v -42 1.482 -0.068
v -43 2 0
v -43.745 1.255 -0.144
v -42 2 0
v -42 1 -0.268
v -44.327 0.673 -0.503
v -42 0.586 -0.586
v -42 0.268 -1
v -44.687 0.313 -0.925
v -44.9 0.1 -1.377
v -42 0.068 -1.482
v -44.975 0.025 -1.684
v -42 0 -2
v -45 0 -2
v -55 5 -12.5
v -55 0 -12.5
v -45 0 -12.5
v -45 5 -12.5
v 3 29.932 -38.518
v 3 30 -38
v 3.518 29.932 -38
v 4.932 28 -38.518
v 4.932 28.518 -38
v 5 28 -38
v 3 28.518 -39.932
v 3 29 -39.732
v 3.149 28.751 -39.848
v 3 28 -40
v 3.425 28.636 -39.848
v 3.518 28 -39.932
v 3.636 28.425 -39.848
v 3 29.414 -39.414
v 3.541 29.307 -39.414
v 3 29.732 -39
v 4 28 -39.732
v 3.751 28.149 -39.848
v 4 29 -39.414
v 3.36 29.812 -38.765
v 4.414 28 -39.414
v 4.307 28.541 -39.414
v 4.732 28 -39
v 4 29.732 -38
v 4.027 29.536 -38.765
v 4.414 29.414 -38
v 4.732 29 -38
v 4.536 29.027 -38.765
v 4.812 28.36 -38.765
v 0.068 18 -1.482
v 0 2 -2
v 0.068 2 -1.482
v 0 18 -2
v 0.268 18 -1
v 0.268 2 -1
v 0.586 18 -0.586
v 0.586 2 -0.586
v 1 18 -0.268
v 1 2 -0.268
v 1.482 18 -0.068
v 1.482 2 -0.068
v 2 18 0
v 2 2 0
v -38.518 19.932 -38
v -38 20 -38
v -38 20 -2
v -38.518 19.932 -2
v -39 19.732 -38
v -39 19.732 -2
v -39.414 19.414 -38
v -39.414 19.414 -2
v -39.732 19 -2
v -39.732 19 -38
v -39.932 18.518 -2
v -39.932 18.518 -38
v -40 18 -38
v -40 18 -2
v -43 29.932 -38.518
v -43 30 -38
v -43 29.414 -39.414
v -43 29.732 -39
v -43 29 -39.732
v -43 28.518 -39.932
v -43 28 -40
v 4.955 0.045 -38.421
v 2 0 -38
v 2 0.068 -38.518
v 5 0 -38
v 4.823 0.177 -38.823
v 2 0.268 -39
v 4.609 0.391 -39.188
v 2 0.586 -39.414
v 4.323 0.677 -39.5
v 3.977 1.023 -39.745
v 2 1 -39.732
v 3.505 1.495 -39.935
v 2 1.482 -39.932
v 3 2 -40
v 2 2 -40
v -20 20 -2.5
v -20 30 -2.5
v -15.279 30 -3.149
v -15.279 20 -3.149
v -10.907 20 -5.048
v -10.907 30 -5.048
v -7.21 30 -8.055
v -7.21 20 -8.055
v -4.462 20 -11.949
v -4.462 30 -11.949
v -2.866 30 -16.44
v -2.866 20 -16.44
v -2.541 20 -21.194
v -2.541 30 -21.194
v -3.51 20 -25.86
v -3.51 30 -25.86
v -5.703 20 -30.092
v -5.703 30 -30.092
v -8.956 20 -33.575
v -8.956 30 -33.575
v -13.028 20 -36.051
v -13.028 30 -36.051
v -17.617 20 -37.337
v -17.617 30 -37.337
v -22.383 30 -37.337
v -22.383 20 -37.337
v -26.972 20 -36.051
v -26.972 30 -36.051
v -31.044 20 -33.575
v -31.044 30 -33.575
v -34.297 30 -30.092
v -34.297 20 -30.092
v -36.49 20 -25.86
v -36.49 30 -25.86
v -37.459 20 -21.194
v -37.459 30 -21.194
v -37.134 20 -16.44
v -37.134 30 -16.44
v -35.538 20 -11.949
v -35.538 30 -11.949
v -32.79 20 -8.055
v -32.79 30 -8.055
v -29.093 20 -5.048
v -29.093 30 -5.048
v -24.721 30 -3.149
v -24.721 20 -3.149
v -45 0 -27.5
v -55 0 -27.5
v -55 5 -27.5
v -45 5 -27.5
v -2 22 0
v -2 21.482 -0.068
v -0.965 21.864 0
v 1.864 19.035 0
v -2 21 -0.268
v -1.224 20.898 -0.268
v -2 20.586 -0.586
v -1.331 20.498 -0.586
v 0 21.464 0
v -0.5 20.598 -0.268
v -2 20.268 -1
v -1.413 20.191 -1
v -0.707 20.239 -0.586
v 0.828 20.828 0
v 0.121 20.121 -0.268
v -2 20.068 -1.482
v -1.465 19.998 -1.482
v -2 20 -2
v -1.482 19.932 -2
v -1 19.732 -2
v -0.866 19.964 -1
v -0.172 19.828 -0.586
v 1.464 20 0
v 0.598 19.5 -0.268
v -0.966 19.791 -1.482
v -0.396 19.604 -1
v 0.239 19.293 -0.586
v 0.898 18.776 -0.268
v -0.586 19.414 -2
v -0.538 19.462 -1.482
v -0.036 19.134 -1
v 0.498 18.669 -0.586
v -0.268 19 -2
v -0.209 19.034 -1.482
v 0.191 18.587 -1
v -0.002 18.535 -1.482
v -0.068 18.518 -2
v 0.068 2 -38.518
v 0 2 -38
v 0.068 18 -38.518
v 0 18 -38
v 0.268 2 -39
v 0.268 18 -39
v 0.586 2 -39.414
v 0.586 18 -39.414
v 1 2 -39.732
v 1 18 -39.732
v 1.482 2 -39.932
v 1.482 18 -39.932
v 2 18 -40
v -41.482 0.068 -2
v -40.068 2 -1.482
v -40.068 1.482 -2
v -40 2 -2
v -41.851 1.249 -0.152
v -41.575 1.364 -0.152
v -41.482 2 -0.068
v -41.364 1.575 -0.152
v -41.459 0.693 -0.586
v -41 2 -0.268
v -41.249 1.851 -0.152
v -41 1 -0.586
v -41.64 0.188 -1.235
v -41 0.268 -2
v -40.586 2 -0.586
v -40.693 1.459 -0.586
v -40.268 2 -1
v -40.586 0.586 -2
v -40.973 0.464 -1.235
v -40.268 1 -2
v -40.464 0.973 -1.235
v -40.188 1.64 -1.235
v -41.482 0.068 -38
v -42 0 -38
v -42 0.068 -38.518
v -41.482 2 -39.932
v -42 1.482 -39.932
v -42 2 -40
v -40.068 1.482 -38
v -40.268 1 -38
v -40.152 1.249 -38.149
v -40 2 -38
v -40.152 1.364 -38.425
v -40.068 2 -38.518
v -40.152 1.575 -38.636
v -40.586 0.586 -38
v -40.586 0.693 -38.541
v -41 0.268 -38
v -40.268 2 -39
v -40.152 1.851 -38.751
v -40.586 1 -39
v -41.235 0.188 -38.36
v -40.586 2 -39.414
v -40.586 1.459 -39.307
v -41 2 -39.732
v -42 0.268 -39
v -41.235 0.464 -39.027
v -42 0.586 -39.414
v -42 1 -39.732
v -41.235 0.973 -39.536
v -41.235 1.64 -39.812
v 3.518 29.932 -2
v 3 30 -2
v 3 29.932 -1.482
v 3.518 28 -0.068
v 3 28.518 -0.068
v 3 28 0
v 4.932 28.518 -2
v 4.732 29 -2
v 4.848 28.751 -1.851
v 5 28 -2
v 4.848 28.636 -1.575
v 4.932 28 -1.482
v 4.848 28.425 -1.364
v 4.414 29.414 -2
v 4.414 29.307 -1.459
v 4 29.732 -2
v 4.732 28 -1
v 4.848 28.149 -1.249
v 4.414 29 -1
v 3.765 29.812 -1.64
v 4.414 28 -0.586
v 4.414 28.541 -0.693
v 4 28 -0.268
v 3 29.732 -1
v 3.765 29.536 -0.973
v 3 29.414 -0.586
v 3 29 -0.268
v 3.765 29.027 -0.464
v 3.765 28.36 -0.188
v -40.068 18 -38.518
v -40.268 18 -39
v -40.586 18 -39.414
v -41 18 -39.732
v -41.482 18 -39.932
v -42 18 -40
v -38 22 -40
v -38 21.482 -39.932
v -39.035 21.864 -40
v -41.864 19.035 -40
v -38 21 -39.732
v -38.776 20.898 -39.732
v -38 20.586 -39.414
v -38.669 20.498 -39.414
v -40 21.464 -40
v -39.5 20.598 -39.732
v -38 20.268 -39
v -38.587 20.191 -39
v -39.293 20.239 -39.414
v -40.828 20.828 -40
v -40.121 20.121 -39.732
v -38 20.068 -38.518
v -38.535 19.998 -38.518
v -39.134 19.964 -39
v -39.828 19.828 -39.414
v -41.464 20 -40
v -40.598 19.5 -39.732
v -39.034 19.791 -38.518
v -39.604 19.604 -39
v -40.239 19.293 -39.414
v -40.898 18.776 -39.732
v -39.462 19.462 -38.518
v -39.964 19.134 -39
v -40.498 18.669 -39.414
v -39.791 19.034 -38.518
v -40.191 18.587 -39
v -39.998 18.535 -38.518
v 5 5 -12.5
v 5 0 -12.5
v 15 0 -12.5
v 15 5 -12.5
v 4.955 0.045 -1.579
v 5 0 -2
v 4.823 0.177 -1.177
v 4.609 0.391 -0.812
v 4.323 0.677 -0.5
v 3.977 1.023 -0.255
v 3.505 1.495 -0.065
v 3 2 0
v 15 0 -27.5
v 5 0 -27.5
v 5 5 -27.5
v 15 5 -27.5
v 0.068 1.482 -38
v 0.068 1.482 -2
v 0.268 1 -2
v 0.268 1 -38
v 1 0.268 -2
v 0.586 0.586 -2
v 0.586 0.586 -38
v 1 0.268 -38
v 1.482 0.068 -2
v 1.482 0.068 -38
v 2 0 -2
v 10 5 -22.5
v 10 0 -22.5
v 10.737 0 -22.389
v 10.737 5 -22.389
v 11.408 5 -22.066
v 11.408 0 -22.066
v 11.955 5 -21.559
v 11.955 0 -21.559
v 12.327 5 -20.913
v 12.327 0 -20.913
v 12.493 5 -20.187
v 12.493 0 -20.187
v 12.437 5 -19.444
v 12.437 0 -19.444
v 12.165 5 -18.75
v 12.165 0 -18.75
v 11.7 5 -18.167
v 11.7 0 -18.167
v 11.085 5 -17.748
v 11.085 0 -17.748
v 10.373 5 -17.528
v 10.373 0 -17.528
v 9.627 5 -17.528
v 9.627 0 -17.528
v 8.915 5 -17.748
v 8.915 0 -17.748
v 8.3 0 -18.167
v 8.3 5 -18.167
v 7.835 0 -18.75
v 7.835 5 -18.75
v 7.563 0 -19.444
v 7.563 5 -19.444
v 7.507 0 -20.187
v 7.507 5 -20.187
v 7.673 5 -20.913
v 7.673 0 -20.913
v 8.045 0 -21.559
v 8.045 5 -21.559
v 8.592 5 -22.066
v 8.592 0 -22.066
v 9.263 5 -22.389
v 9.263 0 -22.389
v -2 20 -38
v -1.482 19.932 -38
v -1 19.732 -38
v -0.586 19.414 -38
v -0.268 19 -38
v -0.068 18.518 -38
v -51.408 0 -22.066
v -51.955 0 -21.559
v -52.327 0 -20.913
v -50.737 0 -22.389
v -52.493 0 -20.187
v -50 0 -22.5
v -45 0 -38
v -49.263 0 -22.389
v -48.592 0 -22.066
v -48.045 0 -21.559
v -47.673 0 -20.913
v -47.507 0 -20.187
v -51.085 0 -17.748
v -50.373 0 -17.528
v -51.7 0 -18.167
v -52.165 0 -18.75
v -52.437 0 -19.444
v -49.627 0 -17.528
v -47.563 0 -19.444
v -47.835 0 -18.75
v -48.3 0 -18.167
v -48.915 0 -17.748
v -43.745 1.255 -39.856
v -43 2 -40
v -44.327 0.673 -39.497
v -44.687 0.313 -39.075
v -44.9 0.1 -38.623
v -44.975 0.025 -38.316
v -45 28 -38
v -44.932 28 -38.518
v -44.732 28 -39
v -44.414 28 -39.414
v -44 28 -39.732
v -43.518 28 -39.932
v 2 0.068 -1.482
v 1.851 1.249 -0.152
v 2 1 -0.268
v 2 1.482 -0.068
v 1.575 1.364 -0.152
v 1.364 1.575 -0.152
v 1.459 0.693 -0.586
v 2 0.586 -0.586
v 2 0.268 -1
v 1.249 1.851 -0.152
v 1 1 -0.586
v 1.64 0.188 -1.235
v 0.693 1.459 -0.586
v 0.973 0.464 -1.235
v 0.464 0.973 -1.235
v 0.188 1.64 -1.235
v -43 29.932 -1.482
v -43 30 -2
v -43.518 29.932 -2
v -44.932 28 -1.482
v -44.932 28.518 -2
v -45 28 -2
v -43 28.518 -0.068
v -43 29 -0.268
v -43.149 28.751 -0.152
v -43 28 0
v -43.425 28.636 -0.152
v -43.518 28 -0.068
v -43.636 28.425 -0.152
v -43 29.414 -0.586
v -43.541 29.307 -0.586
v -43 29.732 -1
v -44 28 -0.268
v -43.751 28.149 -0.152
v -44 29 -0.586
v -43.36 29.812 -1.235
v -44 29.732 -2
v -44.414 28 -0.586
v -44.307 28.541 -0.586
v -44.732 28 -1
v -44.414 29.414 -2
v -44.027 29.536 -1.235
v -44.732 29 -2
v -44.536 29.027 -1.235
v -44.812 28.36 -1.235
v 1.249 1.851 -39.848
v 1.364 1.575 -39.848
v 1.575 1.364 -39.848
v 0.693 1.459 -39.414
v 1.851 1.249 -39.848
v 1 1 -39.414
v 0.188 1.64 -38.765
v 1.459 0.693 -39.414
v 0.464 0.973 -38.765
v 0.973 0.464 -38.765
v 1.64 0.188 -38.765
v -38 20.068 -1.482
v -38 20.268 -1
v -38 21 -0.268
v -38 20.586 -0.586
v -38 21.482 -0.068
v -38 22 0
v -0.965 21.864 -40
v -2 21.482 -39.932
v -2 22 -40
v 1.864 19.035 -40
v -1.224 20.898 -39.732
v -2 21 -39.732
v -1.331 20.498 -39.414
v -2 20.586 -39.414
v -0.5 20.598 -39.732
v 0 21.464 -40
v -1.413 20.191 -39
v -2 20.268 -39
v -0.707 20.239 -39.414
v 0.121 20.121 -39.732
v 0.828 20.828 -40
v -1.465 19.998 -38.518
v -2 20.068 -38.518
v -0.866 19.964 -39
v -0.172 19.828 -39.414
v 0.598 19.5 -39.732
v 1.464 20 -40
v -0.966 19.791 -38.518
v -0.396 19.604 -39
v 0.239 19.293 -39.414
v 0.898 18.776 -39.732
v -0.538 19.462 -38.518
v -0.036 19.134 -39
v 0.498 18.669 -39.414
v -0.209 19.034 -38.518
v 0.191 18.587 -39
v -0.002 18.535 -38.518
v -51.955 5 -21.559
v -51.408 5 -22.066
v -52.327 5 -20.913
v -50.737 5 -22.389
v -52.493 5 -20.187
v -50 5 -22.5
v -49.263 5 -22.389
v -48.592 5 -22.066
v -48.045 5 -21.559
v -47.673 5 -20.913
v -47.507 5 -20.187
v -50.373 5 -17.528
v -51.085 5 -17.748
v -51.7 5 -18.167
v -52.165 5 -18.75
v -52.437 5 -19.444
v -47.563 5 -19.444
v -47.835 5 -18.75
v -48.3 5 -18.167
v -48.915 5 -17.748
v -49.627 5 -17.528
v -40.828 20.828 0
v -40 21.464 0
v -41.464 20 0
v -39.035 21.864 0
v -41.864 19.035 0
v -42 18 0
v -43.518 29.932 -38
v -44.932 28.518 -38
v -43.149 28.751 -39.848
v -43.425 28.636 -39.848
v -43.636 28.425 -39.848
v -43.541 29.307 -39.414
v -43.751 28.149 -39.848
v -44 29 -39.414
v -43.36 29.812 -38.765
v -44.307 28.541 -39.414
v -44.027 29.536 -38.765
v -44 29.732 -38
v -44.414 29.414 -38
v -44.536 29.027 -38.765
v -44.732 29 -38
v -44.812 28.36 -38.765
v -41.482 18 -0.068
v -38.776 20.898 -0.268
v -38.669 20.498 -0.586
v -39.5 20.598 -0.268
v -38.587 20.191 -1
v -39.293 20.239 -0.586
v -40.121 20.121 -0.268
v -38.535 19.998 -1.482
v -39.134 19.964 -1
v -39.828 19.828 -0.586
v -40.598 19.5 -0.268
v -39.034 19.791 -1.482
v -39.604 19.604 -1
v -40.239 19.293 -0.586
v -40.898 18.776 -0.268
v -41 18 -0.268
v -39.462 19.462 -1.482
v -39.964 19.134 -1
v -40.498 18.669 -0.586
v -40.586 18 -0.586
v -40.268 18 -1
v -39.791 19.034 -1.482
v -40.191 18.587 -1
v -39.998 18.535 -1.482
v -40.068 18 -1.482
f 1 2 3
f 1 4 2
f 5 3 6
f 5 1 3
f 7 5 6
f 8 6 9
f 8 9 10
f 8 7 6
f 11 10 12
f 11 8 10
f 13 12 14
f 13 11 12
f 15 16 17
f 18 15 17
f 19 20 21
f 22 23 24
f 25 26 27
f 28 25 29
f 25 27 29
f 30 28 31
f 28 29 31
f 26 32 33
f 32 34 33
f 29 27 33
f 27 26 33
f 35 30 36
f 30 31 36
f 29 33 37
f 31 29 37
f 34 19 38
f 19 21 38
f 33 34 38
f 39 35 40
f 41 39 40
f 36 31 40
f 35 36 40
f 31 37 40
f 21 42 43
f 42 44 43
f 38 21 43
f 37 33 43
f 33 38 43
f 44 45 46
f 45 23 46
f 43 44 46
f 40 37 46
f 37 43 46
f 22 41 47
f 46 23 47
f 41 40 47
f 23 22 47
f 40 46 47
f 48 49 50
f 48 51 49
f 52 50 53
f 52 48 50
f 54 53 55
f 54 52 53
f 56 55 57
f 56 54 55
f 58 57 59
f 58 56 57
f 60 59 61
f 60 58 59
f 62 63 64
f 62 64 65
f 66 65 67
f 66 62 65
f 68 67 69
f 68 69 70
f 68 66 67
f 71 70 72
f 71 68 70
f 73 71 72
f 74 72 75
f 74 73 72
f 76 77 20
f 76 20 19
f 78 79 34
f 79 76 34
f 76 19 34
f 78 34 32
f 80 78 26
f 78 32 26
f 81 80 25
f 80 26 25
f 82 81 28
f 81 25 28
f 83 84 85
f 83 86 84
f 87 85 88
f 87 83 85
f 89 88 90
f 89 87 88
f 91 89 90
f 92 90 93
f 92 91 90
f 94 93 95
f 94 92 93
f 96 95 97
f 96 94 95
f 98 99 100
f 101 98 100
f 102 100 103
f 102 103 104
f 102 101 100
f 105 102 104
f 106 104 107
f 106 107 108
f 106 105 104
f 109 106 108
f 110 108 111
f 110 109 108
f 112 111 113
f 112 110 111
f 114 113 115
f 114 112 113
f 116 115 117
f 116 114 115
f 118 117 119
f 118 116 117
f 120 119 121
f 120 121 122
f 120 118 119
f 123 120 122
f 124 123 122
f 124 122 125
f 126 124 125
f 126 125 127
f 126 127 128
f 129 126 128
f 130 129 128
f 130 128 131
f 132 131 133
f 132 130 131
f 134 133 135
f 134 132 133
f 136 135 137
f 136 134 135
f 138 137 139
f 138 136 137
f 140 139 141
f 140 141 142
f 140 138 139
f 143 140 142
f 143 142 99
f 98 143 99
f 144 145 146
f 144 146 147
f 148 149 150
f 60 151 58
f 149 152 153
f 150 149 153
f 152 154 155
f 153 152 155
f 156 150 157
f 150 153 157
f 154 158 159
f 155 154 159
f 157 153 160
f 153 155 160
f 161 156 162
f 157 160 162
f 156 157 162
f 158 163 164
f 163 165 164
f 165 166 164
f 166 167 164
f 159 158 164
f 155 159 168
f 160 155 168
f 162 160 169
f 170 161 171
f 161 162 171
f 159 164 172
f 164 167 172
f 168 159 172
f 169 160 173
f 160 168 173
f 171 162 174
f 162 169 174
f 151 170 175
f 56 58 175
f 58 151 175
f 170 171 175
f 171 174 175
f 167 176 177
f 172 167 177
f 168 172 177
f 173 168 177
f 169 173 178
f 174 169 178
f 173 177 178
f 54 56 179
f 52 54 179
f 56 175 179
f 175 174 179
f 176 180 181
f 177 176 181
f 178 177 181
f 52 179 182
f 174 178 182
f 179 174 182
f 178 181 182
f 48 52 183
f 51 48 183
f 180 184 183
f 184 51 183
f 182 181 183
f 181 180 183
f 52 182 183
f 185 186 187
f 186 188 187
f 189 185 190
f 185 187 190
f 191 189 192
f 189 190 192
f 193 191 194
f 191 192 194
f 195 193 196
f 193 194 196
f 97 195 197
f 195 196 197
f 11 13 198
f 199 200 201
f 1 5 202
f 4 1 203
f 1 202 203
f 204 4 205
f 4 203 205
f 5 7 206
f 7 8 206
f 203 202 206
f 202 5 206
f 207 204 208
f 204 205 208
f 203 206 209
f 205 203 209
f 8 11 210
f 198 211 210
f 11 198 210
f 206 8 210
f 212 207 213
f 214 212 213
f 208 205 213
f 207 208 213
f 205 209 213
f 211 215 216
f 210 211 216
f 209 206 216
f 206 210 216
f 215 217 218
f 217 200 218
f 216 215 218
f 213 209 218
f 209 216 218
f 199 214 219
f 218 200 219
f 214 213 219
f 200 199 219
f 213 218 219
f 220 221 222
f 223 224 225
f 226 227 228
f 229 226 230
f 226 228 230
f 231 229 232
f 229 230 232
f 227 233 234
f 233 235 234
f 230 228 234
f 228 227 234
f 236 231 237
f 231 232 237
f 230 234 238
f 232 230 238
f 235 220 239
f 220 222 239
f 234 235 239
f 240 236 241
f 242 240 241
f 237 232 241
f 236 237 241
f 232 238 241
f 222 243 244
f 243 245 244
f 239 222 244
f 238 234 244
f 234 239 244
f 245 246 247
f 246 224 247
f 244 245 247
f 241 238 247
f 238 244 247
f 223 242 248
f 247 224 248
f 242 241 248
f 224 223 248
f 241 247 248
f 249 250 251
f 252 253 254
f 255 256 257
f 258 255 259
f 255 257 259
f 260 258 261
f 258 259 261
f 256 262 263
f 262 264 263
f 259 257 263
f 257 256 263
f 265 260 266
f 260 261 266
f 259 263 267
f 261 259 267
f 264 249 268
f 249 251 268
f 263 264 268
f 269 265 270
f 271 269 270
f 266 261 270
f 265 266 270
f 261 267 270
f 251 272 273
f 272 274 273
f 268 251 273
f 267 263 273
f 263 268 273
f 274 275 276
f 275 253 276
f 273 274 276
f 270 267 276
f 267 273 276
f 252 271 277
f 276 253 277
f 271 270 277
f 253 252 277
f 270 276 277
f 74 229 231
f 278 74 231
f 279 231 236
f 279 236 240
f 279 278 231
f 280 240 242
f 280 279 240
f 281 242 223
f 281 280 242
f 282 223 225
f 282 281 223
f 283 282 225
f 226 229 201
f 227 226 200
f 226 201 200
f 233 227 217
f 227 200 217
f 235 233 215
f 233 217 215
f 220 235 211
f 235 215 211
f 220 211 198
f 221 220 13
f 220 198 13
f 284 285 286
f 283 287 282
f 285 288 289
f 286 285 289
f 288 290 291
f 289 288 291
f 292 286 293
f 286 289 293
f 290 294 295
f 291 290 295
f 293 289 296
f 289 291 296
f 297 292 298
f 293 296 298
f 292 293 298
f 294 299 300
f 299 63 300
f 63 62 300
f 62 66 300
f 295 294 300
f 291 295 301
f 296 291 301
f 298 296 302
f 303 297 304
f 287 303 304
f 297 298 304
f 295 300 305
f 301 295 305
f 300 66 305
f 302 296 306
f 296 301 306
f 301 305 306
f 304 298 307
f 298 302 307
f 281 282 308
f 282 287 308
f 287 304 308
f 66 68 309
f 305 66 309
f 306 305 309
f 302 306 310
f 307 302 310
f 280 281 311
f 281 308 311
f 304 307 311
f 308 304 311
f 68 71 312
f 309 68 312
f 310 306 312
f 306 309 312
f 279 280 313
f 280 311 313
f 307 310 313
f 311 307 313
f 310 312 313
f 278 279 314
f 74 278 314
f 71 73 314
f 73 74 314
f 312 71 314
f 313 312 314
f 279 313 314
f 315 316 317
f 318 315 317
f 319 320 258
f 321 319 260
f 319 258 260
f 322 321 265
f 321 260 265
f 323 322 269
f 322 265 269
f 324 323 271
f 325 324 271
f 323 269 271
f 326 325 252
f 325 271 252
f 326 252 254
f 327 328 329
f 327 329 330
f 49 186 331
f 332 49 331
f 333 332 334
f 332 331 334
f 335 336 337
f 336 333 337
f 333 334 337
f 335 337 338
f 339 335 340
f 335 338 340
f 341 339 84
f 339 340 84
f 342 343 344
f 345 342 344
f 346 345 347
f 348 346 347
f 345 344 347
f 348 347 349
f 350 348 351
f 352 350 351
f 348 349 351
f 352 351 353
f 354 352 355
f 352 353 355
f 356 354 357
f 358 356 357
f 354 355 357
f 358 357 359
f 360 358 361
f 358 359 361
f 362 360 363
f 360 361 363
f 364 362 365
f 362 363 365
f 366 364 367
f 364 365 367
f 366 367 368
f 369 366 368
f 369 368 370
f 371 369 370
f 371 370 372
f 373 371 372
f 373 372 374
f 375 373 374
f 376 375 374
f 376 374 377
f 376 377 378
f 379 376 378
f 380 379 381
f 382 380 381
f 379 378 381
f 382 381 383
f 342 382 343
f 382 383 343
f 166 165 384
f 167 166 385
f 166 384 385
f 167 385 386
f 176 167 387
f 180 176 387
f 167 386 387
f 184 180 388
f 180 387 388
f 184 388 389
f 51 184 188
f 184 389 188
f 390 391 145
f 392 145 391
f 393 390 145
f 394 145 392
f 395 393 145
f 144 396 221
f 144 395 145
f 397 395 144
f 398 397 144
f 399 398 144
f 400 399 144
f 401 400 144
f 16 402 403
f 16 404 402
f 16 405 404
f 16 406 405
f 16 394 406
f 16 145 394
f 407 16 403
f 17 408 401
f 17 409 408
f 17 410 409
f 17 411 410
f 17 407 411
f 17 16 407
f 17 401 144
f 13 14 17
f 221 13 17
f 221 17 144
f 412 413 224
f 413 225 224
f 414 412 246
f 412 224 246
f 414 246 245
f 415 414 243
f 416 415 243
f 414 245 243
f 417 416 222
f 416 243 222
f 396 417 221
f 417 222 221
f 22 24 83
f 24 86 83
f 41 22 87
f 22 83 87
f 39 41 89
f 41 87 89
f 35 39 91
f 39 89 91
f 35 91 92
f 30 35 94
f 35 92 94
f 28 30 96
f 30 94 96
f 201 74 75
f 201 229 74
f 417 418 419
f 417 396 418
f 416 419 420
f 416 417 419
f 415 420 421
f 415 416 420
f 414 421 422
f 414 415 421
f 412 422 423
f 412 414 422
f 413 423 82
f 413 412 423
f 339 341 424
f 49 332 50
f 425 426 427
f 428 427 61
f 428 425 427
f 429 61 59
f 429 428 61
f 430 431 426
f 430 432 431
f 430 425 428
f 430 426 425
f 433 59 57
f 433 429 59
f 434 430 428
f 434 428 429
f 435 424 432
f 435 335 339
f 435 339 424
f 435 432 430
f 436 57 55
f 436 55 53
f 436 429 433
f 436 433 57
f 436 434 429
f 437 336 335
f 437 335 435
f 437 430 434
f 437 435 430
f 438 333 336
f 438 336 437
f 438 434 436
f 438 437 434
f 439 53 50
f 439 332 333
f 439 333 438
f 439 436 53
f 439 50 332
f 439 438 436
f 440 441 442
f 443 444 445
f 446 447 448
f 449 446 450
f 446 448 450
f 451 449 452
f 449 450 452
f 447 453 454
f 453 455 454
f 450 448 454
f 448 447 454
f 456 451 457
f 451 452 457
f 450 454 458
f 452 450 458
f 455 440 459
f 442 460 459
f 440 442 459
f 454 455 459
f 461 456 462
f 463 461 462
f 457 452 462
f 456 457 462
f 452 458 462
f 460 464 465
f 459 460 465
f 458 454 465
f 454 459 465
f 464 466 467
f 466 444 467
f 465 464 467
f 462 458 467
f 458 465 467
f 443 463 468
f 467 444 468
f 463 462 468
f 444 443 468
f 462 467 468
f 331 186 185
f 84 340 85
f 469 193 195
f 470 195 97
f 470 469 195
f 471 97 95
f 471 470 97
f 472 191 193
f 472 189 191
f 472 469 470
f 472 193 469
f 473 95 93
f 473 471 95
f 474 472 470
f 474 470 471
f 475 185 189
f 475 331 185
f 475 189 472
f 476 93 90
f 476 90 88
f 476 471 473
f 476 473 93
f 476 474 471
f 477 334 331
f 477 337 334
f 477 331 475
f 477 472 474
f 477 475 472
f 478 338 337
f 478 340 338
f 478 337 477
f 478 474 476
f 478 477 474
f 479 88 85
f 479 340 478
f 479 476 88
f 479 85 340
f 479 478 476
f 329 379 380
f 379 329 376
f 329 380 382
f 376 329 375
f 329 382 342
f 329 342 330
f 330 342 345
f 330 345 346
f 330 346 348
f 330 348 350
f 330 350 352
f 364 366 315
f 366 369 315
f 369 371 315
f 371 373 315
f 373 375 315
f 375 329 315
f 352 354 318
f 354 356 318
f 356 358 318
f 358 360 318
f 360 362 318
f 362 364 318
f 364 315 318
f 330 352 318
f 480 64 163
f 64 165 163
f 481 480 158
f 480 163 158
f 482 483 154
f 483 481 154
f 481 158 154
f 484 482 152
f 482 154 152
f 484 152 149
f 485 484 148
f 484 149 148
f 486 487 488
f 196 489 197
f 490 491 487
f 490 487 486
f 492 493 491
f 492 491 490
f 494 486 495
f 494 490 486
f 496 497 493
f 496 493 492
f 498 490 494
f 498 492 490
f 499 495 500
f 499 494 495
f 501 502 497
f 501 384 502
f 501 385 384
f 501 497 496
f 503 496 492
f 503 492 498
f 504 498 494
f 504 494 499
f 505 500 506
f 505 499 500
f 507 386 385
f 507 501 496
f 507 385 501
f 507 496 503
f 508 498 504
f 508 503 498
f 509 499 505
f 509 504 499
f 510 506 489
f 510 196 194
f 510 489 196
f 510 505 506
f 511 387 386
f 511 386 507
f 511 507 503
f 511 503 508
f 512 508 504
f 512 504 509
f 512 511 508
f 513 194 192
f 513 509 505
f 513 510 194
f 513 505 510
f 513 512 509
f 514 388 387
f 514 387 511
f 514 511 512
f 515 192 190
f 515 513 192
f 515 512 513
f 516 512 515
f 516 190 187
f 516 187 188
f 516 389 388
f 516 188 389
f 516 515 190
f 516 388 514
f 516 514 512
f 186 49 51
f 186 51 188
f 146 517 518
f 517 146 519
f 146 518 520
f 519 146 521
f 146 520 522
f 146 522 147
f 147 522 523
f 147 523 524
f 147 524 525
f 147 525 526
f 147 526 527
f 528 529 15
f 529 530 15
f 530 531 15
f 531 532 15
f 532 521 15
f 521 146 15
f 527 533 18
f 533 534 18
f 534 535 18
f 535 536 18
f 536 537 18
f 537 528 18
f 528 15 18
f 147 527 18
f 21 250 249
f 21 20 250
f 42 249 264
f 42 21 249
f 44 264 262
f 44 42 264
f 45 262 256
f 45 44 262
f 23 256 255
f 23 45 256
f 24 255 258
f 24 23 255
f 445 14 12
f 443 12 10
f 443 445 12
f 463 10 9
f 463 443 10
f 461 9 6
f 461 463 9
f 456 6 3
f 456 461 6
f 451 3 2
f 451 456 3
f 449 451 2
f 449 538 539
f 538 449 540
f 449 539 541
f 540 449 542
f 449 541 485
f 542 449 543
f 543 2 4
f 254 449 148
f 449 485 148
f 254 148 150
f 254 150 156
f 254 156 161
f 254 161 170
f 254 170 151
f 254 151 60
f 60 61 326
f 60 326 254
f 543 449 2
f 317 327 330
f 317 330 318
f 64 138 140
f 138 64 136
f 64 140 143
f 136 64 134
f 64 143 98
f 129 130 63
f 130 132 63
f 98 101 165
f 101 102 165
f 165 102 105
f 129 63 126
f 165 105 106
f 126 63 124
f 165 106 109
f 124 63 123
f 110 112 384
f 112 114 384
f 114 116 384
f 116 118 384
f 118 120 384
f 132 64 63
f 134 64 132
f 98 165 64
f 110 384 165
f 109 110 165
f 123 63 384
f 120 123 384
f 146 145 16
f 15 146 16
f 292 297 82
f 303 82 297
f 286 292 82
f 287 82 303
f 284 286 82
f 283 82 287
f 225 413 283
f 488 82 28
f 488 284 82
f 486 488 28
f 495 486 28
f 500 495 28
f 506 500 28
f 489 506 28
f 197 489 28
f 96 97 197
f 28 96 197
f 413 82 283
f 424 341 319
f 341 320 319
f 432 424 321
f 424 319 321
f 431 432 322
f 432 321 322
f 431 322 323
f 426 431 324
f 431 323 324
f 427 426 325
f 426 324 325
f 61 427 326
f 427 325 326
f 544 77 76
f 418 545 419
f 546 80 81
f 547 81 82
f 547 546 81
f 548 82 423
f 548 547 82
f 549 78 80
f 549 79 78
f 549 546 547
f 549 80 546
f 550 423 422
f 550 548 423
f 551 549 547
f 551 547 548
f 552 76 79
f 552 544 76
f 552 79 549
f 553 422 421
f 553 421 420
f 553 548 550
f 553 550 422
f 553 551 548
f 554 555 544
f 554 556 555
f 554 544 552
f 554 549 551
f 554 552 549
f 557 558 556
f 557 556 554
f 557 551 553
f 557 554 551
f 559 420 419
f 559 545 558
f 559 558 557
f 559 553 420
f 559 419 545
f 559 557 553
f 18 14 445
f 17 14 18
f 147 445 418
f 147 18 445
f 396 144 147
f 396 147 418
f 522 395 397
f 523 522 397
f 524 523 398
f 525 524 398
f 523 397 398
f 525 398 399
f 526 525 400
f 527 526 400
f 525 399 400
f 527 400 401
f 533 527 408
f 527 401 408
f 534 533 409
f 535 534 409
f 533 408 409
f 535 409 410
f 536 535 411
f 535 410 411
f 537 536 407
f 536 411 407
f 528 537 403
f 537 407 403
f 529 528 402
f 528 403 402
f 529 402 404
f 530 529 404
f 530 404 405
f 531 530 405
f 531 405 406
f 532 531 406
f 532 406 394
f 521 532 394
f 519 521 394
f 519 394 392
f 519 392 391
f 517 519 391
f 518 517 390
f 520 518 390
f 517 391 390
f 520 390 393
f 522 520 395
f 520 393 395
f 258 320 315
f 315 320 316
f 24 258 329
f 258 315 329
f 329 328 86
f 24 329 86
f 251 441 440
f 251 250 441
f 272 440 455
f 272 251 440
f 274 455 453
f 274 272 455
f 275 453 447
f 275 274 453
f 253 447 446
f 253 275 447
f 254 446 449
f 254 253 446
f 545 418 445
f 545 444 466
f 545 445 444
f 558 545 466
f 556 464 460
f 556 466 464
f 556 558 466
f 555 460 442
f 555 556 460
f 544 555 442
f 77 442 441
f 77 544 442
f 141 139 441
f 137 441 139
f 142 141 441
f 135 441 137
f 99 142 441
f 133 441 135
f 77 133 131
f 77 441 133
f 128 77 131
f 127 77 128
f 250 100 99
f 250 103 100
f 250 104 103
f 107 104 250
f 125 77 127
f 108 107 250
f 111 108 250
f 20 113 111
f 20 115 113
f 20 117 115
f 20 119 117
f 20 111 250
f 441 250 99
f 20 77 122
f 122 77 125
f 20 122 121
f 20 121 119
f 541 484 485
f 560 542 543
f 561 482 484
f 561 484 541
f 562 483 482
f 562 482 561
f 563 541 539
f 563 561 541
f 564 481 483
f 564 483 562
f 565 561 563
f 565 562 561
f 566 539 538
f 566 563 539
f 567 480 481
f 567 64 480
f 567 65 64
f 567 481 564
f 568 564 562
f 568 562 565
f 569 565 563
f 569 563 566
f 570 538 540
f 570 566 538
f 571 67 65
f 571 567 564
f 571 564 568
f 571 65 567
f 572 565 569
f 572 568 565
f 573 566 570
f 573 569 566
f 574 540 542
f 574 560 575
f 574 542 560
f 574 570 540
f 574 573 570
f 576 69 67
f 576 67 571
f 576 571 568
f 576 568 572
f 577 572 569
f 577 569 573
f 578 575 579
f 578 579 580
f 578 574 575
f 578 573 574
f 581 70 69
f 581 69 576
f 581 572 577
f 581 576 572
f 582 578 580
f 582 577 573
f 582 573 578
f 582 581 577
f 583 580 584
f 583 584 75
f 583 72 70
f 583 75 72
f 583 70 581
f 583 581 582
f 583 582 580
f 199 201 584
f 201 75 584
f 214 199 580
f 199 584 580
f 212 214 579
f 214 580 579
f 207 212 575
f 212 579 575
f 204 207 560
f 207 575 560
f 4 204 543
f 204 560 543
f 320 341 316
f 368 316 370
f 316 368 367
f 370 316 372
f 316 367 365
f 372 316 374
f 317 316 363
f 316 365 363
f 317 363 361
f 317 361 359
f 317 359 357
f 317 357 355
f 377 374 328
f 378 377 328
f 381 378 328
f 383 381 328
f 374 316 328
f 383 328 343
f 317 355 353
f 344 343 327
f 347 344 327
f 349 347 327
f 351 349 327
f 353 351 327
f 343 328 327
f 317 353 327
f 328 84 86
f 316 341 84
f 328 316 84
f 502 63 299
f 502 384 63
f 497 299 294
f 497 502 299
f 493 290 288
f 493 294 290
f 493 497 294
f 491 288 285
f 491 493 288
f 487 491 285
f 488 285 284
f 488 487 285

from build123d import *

# Parameters (mm, degrees)
SKETCH1_W             = 5
SKETCH1_H             = 40
BOSS_EXTRUDE1_DEPTH   = 20
BOSS_EXTRUDE1_2_DEPTH = 20
SKETCH2_W             = 50
SKETCH2_H             = 40
SKETCH2_R             = 17.5
BOSS_EXTRUDE2_DEPTH   = 10
SKETCH3_W             = 15
SKETCH3_H             = 15
SKETCH3_R             = 2.5
BOSS_EXTRUDE3_DEPTH   = 5
FILLET1_R             = 2


with BuildPart() as part:
    # Sketch1 → Boss-Extrude1 (new body)
    with BuildSketch(Plane(origin=(0, 0, 0), x_dir=(1, 0, 0), z_dir=(0, 1, 0))):
        with Locations((-42.5, 20)):
            Rectangle(SKETCH1_W, SKETCH1_H)
    extrude(amount=BOSS_EXTRUDE1_DEPTH)



with BuildPart() as body_2:
    # Sketch1 → Boss-Extrude1 2 (new body)
    with BuildSketch(Plane(origin=(0, 0, 0), x_dir=(1, 0, 0), z_dir=(0, 1, 0))):
        with Locations((2.5, 20)):
            Rectangle(SKETCH1_W, SKETCH1_H)
    extrude(amount=BOSS_EXTRUDE1_2_DEPTH)


with BuildPart() as part_1:
    add(part.part)

    add(body_2.part)  # Boss-Extrude2 merges body 2
    # Sketch2 → Boss-Extrude2 (add)
    with BuildSketch(Plane(origin=(0, 20, 0), x_dir=(1, 0, 0), z_dir=(0, 1, 0))):
        with Locations((-20, 20)):
            Rectangle(SKETCH2_W, SKETCH2_H)
        with Locations(Location((-20, 20, 0), (0, 0, 270))):
            Circle(SKETCH2_R, mode=Mode.SUBTRACT)
    extrude(amount=BOSS_EXTRUDE2_DEPTH)

    # Sketch3 → Boss-Extrude3 (add)
    # profile 1 of 2: a face of its own
    with BuildSketch(Plane.XZ):
        with Locations((-47.5, -20)):
            Rectangle(SKETCH3_W, SKETCH3_H)
        with Locations(Location((-50, -20, 0), (0, 0, 270))):
            Circle(SKETCH3_R, mode=Mode.SUBTRACT)
    # profile 2 of 2: a face of its own
    with BuildSketch(Plane.XZ):
        with Locations((7.5, -20)):
            Rectangle(SKETCH3_W, SKETCH3_H)
        with Locations(Location((10, -20, 0), (0, 0, 270))):
            Circle(SKETCH3_R, mode=Mode.SUBTRACT)
    extrude(amount=-BOSS_EXTRUDE3_DEPTH)

    # Fillet1
    fillet1_edges = [part_1.edges().sort_by_distance(p)[0] for p in [
        (-40, 20, -20),
        (-45, 30, -20),
        (-20, 30, 0),
        (5, 30, -20),
        (-20, 30, -40),
        (-20, 20, 0),
        (5, 15, 0),
        (5, 15, -40),
        (-20, 20, -40),
        (0, 0, -20),
        (0, 10, -40),
        (2.5, 0, 0),
        (0, 10, 0),
        (2.5, 0, -40),
        (0, 20, -20),
        (-42.5, 0, -40),
        (-40, 0, -20),
        (-42.5, 0, 0),
        (-45, 15, -40),
        (-40, 10, -40),
        (-40, 10, 0),
        (-45, 15, 0),
    ]]
    fillet(fillet1_edges, radius=FILLET1_R)


solid = part_1.part
